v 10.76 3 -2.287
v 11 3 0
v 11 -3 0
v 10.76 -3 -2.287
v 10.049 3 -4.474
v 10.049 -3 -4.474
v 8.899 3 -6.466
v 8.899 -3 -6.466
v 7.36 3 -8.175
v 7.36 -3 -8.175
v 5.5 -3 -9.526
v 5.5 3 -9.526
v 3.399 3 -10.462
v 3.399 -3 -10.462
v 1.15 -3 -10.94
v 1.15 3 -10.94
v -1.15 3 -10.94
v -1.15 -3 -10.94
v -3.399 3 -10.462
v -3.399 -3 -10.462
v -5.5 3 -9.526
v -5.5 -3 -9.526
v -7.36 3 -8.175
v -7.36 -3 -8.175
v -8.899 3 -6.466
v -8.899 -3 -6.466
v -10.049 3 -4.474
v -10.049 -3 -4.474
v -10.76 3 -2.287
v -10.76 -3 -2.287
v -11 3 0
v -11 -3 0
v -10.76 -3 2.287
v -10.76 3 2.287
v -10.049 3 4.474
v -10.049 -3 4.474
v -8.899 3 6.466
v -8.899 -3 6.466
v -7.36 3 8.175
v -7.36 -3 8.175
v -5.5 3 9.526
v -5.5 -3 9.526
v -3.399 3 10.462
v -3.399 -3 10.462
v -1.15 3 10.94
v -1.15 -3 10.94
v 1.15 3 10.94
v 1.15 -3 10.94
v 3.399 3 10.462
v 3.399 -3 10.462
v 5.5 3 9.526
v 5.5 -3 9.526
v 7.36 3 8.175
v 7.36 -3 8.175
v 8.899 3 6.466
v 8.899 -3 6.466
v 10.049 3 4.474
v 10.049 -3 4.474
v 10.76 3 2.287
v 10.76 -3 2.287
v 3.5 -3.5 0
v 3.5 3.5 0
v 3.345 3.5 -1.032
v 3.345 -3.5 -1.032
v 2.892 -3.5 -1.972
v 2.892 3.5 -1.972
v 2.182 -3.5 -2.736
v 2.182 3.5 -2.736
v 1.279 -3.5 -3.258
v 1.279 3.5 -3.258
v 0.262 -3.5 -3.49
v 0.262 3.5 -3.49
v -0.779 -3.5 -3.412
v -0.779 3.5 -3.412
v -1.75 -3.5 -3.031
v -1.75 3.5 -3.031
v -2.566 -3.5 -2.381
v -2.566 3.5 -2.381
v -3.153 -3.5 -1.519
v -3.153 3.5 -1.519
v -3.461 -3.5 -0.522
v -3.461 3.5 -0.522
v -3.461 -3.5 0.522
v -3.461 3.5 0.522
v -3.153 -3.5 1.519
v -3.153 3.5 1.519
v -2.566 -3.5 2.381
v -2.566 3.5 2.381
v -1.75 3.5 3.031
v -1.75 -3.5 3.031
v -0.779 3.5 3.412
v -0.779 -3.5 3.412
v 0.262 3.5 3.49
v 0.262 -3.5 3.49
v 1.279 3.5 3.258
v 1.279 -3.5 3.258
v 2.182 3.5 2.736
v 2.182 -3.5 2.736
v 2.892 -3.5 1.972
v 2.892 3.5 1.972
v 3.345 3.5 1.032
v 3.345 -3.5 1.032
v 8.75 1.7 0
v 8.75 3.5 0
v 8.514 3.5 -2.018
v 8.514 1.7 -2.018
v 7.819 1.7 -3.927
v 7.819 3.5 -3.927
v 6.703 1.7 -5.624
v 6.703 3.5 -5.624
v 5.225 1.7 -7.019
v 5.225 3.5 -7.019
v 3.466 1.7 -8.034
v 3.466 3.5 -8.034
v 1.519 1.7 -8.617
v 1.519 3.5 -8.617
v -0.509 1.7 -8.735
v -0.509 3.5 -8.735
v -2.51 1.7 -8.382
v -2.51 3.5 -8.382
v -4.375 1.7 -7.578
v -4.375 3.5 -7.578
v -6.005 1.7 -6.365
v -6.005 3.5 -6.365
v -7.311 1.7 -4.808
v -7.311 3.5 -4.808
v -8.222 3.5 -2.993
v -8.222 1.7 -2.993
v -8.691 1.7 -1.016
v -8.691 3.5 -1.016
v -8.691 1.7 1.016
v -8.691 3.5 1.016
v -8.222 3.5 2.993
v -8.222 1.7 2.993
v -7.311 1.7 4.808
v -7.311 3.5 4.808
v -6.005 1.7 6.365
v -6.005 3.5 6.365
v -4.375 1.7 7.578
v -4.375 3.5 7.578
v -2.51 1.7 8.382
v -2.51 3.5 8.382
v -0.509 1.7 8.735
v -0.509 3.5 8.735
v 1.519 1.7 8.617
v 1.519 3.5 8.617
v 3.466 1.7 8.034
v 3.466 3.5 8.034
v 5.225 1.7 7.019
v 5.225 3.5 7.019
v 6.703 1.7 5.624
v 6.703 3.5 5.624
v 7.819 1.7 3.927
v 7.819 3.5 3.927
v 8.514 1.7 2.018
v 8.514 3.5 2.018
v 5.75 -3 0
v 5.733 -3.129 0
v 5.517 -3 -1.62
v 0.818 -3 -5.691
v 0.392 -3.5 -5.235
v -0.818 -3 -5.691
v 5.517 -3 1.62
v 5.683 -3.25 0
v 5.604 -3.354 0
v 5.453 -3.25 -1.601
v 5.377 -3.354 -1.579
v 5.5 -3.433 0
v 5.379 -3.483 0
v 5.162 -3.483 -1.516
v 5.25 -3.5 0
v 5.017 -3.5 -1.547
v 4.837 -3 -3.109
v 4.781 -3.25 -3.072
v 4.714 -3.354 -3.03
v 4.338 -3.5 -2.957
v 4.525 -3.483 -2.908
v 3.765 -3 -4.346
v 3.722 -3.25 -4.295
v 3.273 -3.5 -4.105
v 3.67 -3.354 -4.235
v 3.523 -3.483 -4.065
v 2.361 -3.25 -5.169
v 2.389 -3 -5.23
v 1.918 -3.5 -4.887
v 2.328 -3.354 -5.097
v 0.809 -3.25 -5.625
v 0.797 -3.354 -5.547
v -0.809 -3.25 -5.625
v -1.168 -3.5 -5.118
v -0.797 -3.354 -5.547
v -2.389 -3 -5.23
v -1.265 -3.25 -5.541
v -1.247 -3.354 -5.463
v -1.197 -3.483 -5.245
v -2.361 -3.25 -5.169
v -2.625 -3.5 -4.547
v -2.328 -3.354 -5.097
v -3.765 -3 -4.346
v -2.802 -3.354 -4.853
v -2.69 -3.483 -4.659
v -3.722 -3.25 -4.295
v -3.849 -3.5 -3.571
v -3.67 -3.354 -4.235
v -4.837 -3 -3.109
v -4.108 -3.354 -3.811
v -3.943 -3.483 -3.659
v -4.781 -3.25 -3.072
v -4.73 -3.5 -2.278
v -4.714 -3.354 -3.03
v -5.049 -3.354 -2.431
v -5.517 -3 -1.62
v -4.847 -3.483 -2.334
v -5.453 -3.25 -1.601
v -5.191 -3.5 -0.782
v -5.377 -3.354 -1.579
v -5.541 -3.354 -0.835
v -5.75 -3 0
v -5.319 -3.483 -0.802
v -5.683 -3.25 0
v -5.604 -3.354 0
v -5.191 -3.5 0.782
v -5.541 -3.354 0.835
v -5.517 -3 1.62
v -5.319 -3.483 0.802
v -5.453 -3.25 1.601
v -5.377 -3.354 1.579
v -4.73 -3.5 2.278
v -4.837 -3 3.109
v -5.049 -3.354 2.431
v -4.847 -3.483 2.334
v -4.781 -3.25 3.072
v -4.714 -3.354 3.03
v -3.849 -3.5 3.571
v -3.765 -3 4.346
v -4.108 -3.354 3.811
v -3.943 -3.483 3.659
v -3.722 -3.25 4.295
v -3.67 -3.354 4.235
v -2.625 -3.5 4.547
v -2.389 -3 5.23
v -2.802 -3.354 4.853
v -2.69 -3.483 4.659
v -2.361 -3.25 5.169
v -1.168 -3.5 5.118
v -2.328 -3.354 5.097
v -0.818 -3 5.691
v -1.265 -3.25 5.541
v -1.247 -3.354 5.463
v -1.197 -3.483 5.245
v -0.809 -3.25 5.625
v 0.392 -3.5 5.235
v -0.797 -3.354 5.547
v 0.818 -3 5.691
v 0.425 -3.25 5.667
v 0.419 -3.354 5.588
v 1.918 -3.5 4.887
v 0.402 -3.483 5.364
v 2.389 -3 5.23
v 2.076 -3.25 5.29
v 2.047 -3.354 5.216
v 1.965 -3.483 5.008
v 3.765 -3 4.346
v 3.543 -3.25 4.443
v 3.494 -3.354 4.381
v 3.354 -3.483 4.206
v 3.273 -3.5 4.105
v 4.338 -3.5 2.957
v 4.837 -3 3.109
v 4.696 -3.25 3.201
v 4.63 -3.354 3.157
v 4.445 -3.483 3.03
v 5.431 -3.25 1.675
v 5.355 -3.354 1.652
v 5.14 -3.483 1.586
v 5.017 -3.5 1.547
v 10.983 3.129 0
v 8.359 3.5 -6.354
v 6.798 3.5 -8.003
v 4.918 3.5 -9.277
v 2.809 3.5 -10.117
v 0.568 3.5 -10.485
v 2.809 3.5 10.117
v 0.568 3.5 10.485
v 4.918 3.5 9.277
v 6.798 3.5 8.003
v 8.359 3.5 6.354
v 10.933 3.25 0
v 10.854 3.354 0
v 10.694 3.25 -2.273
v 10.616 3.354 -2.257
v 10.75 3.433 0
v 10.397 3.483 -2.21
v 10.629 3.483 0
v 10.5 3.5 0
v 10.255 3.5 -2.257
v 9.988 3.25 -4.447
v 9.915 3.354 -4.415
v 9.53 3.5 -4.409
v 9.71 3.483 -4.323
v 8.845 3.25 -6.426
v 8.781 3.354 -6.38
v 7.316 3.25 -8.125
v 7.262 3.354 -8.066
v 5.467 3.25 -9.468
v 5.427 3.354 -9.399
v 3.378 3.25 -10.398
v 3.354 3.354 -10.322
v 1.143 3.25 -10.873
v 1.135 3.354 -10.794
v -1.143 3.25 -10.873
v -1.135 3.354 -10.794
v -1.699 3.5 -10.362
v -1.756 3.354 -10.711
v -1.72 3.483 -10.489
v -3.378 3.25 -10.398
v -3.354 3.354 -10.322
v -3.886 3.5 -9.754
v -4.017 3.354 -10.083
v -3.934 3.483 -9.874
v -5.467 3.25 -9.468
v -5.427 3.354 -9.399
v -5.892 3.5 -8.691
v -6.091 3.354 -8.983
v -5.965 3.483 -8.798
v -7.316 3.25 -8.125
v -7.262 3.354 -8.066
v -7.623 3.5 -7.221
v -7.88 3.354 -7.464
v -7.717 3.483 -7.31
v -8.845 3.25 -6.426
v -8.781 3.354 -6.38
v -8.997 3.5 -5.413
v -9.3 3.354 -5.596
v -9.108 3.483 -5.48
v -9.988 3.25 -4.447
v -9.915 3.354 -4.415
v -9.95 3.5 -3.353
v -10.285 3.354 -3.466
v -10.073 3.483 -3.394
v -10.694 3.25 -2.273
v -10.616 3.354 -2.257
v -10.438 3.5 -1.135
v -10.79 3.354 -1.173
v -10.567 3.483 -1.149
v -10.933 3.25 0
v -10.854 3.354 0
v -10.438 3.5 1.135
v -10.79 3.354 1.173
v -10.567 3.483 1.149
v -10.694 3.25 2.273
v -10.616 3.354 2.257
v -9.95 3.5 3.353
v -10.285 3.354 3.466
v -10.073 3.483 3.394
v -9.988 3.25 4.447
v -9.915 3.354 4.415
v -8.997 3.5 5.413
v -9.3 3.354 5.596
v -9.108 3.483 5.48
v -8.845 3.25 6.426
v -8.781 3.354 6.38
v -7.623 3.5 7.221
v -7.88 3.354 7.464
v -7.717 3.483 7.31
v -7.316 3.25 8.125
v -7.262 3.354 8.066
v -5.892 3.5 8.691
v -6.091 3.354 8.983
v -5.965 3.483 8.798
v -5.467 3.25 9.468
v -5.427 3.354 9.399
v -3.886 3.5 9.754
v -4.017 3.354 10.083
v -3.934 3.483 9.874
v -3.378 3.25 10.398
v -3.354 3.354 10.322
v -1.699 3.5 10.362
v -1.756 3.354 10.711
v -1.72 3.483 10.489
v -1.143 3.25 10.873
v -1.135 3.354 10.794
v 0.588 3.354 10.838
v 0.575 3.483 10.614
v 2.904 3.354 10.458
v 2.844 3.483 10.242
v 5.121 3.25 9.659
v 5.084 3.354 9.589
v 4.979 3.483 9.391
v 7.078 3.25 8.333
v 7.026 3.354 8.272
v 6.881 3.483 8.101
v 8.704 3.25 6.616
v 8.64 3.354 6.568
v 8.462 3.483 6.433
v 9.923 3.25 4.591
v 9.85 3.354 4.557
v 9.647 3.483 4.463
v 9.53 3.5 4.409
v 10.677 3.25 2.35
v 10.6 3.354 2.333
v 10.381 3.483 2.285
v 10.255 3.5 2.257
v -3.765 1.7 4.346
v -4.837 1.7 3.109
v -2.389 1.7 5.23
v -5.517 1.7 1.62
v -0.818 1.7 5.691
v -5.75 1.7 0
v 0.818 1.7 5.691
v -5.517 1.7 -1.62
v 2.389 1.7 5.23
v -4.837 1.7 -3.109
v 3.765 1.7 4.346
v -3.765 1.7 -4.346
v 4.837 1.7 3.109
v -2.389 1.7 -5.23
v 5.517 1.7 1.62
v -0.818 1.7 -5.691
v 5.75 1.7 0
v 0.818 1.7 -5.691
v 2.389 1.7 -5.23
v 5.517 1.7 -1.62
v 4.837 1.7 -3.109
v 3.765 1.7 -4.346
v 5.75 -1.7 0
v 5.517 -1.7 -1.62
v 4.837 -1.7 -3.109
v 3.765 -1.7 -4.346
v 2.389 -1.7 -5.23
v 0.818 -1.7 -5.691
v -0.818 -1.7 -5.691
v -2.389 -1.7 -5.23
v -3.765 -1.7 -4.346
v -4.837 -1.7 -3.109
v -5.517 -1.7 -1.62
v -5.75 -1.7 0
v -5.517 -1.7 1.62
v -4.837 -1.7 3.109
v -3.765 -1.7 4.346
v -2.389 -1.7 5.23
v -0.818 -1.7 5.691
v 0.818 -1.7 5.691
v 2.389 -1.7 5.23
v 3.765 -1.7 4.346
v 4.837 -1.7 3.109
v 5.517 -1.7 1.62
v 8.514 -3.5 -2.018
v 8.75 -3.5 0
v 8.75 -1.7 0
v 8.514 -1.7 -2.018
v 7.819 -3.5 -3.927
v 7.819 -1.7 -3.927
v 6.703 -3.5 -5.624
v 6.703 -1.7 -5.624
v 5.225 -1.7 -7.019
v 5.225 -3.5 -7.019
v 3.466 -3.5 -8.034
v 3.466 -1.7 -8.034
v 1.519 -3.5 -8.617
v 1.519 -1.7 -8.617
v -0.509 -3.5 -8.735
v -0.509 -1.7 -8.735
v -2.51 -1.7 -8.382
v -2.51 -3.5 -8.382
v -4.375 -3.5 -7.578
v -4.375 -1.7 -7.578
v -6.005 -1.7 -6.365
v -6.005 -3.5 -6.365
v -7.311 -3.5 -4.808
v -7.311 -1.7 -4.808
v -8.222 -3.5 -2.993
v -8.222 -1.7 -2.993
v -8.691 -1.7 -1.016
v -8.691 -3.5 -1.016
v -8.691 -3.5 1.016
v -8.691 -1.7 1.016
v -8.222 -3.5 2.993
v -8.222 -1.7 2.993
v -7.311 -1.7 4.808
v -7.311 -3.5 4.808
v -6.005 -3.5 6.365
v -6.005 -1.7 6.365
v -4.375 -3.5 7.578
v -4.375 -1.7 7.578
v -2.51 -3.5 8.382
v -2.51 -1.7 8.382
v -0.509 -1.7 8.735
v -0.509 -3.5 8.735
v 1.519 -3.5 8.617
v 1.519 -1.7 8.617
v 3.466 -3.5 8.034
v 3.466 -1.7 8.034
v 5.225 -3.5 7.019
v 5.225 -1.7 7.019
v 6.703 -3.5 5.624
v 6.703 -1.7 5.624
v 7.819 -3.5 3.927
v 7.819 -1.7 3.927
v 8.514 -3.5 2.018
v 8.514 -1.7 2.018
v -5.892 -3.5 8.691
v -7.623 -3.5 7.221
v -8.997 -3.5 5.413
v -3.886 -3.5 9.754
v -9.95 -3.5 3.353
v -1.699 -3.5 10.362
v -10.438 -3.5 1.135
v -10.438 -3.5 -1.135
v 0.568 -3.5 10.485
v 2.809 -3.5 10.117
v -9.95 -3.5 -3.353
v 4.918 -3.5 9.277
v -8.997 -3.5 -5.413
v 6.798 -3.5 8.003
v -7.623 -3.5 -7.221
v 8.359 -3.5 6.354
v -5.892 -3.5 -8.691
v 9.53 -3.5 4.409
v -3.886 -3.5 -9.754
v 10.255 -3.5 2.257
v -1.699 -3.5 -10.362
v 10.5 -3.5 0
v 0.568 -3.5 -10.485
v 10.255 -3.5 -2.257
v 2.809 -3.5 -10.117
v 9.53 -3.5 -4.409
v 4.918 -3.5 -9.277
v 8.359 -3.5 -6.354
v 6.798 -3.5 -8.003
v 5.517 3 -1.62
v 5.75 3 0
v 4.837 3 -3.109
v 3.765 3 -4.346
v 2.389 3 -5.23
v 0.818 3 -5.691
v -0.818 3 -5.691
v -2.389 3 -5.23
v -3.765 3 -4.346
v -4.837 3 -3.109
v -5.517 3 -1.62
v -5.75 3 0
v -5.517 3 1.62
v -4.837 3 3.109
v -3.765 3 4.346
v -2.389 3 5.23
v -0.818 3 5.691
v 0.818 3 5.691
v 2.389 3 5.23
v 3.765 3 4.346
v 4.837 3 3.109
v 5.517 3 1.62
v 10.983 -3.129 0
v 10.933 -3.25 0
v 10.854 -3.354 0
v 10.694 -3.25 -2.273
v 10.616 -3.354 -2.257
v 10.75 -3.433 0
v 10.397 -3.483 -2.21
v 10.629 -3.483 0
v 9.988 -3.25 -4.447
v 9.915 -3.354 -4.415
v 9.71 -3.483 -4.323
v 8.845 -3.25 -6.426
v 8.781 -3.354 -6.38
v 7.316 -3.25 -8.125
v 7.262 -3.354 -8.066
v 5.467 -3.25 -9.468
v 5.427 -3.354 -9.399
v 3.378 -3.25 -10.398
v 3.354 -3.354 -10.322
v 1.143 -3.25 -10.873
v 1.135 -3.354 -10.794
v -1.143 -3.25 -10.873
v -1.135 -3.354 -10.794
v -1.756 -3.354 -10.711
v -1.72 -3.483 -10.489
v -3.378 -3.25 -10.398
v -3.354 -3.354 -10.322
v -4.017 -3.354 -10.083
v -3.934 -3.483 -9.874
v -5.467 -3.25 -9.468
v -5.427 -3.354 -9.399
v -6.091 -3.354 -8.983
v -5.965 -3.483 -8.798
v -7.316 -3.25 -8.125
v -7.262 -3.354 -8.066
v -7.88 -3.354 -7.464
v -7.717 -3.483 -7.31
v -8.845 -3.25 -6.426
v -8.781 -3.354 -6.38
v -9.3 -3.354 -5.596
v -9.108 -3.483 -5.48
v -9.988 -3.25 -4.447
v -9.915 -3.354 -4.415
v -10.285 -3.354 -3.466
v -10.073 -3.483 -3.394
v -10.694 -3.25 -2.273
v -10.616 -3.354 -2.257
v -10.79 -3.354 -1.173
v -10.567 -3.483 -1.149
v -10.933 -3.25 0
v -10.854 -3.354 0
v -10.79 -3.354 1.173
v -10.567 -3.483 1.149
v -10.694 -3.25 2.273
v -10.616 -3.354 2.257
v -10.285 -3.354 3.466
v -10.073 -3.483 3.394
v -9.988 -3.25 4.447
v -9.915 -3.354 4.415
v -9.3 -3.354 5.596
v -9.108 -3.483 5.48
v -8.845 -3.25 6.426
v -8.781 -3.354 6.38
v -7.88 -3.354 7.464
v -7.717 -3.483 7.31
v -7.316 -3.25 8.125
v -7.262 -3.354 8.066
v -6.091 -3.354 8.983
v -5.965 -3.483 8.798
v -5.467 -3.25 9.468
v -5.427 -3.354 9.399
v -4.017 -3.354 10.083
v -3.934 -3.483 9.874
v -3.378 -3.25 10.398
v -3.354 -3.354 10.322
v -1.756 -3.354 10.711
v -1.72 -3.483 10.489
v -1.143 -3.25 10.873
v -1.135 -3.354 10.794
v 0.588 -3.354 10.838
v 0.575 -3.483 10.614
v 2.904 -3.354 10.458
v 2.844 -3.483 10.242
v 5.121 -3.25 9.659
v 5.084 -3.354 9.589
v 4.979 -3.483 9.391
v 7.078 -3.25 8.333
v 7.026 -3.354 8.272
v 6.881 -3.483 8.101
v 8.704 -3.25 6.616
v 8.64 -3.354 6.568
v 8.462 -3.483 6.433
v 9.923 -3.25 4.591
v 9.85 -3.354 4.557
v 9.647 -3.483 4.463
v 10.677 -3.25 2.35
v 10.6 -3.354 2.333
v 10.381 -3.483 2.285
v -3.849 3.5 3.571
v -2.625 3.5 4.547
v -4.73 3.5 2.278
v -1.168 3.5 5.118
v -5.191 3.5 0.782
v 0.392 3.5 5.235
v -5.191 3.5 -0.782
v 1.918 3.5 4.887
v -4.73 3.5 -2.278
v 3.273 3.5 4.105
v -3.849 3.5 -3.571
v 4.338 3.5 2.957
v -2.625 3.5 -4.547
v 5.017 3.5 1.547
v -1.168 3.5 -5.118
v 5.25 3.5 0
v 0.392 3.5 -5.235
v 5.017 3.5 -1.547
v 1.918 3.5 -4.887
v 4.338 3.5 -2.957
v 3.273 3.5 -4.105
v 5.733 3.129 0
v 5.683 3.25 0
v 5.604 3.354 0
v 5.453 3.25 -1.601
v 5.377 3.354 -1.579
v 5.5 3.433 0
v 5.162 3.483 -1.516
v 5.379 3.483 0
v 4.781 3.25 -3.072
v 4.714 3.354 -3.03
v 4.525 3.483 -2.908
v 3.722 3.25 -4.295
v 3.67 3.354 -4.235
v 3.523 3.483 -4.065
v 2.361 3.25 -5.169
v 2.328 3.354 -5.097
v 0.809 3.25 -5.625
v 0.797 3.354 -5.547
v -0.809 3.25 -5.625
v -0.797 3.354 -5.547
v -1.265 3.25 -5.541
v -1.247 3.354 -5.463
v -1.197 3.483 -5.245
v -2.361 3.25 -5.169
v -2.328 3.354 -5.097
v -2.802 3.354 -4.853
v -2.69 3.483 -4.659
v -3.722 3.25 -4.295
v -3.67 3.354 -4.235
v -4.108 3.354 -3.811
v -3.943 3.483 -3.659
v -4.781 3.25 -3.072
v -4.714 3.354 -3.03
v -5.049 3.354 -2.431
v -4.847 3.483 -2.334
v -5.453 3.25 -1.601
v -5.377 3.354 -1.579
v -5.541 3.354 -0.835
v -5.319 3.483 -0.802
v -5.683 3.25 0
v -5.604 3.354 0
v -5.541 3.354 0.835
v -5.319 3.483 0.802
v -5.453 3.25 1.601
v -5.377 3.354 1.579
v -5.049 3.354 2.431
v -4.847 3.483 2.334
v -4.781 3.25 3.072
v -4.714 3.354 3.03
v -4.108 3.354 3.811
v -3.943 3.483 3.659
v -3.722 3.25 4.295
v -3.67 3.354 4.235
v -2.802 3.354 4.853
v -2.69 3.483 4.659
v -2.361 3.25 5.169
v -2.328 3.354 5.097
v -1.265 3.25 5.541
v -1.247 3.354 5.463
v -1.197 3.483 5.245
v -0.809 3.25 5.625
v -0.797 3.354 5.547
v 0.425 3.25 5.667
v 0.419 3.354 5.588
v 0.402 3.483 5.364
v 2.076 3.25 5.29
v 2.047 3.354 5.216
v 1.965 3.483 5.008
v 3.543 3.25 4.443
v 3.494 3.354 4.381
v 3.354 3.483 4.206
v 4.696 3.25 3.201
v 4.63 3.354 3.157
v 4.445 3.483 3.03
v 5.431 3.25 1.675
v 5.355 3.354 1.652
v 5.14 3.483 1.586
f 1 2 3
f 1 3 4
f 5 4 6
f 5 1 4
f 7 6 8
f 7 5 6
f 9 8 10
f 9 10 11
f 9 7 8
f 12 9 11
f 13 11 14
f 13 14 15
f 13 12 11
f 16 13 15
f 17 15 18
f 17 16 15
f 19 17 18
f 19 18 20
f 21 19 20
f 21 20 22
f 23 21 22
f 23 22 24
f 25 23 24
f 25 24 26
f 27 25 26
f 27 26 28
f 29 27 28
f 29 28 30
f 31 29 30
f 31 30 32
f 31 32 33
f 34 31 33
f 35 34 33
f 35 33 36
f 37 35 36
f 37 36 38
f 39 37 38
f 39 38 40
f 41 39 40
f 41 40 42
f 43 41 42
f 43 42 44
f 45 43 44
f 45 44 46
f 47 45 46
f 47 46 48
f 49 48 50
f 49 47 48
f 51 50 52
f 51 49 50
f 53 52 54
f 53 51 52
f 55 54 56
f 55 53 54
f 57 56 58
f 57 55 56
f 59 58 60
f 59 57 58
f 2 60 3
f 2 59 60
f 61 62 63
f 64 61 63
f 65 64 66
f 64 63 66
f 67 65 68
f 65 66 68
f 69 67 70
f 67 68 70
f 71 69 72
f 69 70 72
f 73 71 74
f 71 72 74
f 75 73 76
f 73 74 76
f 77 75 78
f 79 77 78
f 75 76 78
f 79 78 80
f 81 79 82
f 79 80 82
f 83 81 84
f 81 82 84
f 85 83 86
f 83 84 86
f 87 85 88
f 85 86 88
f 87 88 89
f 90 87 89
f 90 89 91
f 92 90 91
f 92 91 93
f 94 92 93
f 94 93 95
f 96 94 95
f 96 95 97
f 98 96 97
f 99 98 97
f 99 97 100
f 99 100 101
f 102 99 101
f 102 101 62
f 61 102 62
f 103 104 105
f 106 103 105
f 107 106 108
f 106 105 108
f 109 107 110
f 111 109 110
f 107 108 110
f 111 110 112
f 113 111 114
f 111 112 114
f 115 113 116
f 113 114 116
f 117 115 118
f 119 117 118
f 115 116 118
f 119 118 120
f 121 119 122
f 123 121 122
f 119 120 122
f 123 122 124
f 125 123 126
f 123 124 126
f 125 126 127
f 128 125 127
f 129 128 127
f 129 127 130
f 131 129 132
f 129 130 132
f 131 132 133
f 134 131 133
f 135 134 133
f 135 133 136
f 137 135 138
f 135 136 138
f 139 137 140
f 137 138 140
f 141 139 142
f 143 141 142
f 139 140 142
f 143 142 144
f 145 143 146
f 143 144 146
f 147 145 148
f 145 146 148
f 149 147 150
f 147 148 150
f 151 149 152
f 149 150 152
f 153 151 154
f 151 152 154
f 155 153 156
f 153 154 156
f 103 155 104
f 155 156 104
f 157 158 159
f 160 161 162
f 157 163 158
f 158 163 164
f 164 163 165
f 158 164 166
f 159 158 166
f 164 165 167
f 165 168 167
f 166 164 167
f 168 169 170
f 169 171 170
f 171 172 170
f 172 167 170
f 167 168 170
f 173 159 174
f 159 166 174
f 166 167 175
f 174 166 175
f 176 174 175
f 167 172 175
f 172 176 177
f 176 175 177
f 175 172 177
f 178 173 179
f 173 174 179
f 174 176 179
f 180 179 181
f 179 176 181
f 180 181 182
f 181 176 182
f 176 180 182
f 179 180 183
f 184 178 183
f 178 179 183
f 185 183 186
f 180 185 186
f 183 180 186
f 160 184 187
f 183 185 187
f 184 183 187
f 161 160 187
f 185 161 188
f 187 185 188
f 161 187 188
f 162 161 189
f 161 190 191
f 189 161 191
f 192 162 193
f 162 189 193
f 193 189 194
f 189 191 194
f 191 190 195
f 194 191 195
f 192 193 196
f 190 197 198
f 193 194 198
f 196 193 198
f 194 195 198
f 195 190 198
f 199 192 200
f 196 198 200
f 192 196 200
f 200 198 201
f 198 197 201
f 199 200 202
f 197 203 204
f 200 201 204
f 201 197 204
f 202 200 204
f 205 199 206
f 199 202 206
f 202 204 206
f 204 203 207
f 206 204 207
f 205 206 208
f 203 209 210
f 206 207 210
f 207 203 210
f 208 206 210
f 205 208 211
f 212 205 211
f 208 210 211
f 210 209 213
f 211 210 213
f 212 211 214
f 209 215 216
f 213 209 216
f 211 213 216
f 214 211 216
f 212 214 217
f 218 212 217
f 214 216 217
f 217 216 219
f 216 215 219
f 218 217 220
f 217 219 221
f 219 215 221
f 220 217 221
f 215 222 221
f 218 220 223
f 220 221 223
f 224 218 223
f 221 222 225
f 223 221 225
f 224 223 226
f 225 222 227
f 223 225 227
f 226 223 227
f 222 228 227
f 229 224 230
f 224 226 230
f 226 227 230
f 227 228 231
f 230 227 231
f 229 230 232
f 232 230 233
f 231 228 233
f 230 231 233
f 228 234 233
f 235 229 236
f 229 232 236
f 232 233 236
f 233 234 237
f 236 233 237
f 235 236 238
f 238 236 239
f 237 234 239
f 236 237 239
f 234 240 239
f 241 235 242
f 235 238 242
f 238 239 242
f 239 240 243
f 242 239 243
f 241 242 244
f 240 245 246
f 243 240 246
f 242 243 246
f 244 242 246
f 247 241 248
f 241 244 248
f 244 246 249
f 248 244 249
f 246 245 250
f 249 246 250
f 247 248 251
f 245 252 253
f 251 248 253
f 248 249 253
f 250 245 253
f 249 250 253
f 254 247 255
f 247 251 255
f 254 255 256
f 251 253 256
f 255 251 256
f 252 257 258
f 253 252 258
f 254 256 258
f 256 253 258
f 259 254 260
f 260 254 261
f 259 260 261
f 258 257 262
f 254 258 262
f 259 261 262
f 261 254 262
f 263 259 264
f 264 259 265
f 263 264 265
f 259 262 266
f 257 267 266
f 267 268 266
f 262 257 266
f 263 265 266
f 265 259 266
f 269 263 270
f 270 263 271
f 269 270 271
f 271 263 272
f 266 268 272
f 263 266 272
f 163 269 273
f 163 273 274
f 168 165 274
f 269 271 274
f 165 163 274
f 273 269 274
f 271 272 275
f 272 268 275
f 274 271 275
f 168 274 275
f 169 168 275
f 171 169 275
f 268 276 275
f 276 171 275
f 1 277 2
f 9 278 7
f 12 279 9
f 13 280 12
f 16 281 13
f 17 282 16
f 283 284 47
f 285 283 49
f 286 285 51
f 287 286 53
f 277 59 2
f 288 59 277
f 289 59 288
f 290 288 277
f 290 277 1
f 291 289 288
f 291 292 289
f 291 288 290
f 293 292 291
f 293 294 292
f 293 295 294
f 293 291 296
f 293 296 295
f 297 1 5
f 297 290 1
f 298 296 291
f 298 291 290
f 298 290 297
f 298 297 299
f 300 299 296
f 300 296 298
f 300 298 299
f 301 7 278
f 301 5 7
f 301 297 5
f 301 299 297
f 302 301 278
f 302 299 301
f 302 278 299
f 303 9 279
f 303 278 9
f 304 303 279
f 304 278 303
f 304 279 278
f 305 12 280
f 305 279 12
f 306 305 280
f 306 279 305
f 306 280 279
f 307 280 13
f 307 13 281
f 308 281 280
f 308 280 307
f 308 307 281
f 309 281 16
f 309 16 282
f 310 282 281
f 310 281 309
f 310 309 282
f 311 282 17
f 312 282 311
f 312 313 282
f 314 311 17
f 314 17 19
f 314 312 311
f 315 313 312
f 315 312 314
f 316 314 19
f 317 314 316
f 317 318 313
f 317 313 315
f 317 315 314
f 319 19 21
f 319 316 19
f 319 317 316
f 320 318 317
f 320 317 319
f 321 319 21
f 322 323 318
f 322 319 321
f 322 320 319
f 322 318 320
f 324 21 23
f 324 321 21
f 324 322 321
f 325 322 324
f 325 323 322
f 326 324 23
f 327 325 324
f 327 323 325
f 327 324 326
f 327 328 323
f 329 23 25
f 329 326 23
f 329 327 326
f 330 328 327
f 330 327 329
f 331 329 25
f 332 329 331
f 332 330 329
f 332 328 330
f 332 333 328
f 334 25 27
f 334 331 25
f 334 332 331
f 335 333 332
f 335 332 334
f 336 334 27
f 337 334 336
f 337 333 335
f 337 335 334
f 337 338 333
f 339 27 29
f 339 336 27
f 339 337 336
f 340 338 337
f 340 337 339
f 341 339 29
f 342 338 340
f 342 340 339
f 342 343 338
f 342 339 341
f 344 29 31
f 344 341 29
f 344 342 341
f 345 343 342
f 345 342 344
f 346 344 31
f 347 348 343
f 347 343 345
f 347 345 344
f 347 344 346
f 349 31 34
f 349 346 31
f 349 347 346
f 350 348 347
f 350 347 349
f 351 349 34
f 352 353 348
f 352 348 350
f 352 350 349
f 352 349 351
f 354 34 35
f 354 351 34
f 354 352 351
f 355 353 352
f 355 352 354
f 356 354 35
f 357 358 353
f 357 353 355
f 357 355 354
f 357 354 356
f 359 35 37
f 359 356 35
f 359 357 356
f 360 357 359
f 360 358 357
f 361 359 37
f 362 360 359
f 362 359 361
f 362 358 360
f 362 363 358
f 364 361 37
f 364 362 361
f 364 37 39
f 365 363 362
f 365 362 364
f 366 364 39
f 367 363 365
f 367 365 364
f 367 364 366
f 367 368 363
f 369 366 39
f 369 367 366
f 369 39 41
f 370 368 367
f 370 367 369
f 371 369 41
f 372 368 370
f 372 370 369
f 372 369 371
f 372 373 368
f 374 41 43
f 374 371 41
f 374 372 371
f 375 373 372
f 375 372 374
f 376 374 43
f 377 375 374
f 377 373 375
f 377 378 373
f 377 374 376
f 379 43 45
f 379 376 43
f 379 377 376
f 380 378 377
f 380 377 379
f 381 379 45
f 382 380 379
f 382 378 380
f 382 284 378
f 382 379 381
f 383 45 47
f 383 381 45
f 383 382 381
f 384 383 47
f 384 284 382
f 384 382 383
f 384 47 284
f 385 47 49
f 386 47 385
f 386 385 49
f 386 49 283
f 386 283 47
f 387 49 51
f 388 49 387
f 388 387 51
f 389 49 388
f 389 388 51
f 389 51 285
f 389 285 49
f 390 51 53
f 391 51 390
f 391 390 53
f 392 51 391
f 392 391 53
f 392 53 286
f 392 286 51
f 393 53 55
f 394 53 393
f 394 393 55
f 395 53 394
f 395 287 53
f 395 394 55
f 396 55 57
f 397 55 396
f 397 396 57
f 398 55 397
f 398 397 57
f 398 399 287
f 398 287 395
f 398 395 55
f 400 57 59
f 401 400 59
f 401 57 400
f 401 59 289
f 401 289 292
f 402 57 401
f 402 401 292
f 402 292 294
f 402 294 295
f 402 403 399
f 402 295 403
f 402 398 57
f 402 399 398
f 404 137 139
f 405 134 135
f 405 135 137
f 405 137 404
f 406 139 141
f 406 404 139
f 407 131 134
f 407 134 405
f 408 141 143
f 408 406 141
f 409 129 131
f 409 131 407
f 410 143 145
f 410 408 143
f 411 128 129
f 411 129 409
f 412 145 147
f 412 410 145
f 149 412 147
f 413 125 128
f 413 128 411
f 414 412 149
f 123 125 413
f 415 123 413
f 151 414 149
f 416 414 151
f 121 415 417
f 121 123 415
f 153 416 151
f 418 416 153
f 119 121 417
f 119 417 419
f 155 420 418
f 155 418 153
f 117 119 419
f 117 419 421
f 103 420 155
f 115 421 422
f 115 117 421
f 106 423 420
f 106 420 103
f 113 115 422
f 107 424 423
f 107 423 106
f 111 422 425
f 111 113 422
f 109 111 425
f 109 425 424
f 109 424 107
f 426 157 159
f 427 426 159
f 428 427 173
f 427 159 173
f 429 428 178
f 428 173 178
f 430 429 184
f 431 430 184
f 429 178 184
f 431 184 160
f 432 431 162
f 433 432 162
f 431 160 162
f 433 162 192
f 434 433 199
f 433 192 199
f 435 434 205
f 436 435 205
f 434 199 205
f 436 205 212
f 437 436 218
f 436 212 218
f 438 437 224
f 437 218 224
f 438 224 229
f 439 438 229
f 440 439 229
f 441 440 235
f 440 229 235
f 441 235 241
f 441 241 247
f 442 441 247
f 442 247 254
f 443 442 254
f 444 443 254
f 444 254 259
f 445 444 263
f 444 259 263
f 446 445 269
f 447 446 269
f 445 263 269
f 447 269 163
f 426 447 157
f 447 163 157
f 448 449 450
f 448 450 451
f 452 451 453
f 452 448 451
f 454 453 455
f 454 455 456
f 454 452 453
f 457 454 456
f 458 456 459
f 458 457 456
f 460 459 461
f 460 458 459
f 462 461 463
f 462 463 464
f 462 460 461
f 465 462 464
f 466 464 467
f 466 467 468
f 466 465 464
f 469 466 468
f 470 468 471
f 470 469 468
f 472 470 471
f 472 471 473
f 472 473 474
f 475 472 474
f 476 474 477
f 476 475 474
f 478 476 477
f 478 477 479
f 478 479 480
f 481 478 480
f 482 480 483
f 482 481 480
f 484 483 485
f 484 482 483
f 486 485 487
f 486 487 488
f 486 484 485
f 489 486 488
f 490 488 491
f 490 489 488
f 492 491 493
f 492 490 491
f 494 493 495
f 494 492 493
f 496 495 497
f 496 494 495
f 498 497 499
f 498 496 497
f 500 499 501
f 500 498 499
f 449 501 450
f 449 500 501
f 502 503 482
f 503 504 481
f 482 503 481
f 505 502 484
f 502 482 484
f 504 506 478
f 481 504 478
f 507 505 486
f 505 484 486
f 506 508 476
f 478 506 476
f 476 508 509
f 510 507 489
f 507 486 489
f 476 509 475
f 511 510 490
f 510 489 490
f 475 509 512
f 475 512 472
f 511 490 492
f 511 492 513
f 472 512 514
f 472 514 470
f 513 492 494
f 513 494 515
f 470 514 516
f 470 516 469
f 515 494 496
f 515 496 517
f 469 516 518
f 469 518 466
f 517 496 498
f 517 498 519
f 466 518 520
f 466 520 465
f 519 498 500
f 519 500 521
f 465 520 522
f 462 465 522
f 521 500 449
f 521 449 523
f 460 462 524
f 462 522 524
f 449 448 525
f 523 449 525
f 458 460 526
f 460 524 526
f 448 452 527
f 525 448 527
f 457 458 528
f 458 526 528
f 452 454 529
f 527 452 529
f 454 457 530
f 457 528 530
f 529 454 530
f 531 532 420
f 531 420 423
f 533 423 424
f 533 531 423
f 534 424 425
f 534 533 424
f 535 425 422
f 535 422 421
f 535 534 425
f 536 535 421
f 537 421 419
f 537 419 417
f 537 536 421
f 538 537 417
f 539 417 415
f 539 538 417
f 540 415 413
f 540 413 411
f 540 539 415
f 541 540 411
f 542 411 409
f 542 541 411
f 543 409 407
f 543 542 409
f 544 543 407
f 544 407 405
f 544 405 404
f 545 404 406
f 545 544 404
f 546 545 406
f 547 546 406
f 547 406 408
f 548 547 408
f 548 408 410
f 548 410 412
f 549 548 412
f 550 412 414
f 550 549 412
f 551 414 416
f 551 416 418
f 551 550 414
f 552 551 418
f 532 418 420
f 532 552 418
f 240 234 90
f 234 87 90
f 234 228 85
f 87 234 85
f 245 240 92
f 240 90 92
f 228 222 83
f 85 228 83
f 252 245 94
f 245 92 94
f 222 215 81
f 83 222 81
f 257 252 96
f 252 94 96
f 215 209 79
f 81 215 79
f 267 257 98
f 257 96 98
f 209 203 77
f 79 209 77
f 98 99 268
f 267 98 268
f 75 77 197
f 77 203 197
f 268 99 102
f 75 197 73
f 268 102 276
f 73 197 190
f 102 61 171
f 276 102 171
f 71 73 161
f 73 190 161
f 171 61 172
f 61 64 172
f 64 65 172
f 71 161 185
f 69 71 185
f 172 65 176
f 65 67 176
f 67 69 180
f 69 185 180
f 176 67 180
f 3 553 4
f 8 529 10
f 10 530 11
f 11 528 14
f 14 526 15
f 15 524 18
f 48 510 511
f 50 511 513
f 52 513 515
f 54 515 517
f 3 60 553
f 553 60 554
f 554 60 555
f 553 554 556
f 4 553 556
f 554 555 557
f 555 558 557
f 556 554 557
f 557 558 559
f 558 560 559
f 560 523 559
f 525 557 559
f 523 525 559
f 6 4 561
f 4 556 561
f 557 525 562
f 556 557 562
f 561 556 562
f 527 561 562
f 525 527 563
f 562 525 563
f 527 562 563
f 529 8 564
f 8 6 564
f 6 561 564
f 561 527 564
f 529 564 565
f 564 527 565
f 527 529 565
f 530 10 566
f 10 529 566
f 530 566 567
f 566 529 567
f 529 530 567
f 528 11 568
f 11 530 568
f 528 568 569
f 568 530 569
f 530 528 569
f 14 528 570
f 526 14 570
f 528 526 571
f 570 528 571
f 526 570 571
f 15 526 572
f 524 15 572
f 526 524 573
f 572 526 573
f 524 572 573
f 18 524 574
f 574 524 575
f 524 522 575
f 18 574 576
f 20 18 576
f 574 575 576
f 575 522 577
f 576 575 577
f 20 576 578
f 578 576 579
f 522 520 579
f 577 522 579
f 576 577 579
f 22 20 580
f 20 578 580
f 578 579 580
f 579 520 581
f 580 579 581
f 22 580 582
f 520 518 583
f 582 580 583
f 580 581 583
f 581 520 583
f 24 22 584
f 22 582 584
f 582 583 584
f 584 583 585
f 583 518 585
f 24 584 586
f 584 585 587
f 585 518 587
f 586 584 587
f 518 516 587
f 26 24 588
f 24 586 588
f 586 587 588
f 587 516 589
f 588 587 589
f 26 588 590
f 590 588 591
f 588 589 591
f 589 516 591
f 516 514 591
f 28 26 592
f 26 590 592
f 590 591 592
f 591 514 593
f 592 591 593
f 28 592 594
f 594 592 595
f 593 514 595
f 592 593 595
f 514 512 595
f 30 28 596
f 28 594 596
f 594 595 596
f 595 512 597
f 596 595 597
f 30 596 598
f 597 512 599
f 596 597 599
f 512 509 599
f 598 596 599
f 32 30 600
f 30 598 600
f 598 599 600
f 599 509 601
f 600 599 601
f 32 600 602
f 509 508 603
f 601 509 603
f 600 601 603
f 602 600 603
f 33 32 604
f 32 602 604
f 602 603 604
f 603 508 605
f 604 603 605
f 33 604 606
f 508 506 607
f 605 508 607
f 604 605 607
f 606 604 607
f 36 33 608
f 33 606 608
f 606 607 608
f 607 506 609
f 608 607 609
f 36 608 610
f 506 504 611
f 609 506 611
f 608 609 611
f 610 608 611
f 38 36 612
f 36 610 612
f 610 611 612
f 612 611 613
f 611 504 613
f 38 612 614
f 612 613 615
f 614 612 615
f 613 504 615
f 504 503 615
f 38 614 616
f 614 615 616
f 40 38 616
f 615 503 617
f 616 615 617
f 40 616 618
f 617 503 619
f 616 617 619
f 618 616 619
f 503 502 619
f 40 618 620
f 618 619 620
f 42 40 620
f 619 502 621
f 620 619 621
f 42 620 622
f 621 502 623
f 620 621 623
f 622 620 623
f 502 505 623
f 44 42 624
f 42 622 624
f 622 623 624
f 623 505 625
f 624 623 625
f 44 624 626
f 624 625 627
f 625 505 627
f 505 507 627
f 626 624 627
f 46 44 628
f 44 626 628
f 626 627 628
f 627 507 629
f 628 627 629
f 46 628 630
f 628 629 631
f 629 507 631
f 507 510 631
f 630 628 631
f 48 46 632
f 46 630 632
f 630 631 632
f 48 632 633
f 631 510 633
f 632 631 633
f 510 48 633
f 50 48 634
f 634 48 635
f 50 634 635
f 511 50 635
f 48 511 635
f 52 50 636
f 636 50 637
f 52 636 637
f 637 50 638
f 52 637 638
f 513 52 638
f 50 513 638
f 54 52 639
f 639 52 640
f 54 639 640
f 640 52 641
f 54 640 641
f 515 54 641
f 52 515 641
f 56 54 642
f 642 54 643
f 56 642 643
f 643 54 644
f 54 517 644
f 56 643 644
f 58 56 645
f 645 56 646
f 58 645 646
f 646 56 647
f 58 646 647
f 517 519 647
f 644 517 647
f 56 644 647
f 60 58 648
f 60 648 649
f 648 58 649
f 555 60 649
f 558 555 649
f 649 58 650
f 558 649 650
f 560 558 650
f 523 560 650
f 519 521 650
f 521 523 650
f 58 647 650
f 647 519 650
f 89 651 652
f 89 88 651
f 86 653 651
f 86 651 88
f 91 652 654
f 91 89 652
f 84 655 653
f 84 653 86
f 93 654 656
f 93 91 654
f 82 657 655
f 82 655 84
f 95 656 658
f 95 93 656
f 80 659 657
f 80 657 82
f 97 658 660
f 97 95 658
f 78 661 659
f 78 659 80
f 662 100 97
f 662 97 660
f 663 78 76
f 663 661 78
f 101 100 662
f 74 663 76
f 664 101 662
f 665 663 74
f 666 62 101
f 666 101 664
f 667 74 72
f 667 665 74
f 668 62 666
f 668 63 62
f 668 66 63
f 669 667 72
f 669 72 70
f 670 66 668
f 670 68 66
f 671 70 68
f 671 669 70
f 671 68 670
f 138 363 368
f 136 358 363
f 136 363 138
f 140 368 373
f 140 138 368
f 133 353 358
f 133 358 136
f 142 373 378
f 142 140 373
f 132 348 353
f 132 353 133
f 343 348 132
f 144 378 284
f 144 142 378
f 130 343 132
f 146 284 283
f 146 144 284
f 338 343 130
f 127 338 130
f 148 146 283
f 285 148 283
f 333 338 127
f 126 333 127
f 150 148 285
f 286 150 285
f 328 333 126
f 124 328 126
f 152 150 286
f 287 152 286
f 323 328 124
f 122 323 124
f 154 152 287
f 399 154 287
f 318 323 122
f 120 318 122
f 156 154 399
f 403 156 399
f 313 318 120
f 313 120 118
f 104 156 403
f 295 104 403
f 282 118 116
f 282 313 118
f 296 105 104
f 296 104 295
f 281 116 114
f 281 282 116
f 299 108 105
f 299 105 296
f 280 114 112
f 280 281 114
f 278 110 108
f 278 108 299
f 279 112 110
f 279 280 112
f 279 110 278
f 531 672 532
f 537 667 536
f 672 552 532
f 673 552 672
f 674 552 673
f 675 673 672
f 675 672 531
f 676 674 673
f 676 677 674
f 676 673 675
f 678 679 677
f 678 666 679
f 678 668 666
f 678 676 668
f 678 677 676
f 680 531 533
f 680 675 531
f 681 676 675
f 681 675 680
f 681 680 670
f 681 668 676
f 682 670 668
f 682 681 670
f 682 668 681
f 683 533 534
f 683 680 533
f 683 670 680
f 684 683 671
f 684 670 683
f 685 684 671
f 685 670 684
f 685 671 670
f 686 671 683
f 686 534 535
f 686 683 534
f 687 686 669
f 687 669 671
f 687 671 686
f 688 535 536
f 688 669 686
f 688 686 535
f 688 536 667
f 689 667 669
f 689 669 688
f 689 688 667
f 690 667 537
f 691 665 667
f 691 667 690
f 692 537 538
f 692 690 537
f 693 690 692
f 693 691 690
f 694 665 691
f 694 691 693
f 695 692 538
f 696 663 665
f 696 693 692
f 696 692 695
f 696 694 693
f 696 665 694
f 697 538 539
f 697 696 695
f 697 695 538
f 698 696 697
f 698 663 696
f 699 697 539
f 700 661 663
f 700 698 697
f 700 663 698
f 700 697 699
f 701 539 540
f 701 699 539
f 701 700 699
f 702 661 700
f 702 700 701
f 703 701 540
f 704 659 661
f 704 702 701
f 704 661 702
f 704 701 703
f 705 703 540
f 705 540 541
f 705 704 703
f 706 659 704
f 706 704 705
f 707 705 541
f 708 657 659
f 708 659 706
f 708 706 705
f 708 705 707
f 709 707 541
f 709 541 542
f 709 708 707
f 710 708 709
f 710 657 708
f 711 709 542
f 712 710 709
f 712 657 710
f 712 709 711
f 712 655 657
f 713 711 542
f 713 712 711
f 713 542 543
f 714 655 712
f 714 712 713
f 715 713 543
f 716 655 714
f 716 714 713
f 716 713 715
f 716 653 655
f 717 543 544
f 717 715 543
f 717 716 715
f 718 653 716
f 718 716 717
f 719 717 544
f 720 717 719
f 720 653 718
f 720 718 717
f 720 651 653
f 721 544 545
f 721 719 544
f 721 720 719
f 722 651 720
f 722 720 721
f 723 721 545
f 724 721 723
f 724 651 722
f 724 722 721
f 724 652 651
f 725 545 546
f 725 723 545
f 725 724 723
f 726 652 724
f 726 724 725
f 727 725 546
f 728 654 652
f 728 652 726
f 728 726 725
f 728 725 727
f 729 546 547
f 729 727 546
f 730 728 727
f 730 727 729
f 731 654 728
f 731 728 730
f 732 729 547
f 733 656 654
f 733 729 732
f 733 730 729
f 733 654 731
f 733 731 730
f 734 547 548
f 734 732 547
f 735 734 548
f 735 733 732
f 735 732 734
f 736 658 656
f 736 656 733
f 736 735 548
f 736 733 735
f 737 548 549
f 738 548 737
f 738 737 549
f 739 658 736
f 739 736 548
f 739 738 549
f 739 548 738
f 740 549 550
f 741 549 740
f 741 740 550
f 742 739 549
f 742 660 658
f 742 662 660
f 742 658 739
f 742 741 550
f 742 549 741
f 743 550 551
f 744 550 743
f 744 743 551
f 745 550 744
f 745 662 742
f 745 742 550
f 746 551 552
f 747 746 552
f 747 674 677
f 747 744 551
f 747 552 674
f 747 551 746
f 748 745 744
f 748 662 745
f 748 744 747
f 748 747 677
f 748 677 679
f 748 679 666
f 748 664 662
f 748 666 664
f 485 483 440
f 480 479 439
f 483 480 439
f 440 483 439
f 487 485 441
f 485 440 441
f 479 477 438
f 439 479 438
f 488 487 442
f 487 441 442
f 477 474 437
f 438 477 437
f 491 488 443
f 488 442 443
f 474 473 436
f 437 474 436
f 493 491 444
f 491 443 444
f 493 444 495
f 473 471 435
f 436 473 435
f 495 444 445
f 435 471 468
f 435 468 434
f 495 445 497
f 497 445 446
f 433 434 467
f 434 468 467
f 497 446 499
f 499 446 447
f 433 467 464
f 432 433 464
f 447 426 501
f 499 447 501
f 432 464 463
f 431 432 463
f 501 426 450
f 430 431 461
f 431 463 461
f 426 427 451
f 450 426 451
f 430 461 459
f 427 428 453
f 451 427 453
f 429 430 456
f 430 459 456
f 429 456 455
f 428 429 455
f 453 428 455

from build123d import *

# Parameters (mm, degrees)
SKETCH1_R           = 11
BOSS_EXTRUDE1_DEPTH = 3.5
SKETCH3_R           = 3.5
CUT_EXTRUDE1_DEPTH  = 8
SKETCH3_3_R         = 8.75
SKETCH3_3_R_2       = 5.75
CUT_EXTRUDE2_DEPTH  = 1.8
FILLET1_R           = 0.5


with BuildPart() as part:
    # Sketch1 → Boss-Extrude1 (new body, symmetric)
    with BuildSketch(Plane(origin=(0, 0, 0), x_dir=(1, 0, 0), z_dir=(0, 1, 0))):
        Circle(SKETCH1_R)
    extrude(amount=BOSS_EXTRUDE1_DEPTH, both=True)

    # Sketch3 → Cut-Extrude1 (cut, through all)
    with BuildSketch(Plane(origin=(0, 3.5, 0), x_dir=(1, 0, 0), z_dir=(0, 1, 0))):
        Circle(SKETCH3_R)
    extrude(amount=-CUT_EXTRUDE1_DEPTH, mode=Mode.SUBTRACT)

    # Sketch3<3> → Cut-Extrude2 (cut)
    with BuildSketch(Plane(origin=(0, 3.5, 0), x_dir=(1, 0, 0), z_dir=(0, 1, 0))):
        Circle(SKETCH3_3_R)
        Circle(SKETCH3_3_R_2, mode=Mode.SUBTRACT)
    cut_extrude2 = extrude(amount=-CUT_EXTRUDE2_DEPTH, mode=Mode.SUBTRACT)

    # Mirror1: Cut-Extrude2 across plane
    add(cut_extrude2.mirror(Plane.ZX), mode=Mode.SUBTRACT)

    # Fillet1
    fillet1_edges = [part.edges().sort_by_distance(p)[0] for p in [
        (-5.75, 3.5, 0),
        (-11, -3.5, 0),
        (-5.75, -3.5, 0),
        (-11, 3.5, 0),
    ]]
    fillet(fillet1_edges, radius=FILLET1_R)


solid = part.part
